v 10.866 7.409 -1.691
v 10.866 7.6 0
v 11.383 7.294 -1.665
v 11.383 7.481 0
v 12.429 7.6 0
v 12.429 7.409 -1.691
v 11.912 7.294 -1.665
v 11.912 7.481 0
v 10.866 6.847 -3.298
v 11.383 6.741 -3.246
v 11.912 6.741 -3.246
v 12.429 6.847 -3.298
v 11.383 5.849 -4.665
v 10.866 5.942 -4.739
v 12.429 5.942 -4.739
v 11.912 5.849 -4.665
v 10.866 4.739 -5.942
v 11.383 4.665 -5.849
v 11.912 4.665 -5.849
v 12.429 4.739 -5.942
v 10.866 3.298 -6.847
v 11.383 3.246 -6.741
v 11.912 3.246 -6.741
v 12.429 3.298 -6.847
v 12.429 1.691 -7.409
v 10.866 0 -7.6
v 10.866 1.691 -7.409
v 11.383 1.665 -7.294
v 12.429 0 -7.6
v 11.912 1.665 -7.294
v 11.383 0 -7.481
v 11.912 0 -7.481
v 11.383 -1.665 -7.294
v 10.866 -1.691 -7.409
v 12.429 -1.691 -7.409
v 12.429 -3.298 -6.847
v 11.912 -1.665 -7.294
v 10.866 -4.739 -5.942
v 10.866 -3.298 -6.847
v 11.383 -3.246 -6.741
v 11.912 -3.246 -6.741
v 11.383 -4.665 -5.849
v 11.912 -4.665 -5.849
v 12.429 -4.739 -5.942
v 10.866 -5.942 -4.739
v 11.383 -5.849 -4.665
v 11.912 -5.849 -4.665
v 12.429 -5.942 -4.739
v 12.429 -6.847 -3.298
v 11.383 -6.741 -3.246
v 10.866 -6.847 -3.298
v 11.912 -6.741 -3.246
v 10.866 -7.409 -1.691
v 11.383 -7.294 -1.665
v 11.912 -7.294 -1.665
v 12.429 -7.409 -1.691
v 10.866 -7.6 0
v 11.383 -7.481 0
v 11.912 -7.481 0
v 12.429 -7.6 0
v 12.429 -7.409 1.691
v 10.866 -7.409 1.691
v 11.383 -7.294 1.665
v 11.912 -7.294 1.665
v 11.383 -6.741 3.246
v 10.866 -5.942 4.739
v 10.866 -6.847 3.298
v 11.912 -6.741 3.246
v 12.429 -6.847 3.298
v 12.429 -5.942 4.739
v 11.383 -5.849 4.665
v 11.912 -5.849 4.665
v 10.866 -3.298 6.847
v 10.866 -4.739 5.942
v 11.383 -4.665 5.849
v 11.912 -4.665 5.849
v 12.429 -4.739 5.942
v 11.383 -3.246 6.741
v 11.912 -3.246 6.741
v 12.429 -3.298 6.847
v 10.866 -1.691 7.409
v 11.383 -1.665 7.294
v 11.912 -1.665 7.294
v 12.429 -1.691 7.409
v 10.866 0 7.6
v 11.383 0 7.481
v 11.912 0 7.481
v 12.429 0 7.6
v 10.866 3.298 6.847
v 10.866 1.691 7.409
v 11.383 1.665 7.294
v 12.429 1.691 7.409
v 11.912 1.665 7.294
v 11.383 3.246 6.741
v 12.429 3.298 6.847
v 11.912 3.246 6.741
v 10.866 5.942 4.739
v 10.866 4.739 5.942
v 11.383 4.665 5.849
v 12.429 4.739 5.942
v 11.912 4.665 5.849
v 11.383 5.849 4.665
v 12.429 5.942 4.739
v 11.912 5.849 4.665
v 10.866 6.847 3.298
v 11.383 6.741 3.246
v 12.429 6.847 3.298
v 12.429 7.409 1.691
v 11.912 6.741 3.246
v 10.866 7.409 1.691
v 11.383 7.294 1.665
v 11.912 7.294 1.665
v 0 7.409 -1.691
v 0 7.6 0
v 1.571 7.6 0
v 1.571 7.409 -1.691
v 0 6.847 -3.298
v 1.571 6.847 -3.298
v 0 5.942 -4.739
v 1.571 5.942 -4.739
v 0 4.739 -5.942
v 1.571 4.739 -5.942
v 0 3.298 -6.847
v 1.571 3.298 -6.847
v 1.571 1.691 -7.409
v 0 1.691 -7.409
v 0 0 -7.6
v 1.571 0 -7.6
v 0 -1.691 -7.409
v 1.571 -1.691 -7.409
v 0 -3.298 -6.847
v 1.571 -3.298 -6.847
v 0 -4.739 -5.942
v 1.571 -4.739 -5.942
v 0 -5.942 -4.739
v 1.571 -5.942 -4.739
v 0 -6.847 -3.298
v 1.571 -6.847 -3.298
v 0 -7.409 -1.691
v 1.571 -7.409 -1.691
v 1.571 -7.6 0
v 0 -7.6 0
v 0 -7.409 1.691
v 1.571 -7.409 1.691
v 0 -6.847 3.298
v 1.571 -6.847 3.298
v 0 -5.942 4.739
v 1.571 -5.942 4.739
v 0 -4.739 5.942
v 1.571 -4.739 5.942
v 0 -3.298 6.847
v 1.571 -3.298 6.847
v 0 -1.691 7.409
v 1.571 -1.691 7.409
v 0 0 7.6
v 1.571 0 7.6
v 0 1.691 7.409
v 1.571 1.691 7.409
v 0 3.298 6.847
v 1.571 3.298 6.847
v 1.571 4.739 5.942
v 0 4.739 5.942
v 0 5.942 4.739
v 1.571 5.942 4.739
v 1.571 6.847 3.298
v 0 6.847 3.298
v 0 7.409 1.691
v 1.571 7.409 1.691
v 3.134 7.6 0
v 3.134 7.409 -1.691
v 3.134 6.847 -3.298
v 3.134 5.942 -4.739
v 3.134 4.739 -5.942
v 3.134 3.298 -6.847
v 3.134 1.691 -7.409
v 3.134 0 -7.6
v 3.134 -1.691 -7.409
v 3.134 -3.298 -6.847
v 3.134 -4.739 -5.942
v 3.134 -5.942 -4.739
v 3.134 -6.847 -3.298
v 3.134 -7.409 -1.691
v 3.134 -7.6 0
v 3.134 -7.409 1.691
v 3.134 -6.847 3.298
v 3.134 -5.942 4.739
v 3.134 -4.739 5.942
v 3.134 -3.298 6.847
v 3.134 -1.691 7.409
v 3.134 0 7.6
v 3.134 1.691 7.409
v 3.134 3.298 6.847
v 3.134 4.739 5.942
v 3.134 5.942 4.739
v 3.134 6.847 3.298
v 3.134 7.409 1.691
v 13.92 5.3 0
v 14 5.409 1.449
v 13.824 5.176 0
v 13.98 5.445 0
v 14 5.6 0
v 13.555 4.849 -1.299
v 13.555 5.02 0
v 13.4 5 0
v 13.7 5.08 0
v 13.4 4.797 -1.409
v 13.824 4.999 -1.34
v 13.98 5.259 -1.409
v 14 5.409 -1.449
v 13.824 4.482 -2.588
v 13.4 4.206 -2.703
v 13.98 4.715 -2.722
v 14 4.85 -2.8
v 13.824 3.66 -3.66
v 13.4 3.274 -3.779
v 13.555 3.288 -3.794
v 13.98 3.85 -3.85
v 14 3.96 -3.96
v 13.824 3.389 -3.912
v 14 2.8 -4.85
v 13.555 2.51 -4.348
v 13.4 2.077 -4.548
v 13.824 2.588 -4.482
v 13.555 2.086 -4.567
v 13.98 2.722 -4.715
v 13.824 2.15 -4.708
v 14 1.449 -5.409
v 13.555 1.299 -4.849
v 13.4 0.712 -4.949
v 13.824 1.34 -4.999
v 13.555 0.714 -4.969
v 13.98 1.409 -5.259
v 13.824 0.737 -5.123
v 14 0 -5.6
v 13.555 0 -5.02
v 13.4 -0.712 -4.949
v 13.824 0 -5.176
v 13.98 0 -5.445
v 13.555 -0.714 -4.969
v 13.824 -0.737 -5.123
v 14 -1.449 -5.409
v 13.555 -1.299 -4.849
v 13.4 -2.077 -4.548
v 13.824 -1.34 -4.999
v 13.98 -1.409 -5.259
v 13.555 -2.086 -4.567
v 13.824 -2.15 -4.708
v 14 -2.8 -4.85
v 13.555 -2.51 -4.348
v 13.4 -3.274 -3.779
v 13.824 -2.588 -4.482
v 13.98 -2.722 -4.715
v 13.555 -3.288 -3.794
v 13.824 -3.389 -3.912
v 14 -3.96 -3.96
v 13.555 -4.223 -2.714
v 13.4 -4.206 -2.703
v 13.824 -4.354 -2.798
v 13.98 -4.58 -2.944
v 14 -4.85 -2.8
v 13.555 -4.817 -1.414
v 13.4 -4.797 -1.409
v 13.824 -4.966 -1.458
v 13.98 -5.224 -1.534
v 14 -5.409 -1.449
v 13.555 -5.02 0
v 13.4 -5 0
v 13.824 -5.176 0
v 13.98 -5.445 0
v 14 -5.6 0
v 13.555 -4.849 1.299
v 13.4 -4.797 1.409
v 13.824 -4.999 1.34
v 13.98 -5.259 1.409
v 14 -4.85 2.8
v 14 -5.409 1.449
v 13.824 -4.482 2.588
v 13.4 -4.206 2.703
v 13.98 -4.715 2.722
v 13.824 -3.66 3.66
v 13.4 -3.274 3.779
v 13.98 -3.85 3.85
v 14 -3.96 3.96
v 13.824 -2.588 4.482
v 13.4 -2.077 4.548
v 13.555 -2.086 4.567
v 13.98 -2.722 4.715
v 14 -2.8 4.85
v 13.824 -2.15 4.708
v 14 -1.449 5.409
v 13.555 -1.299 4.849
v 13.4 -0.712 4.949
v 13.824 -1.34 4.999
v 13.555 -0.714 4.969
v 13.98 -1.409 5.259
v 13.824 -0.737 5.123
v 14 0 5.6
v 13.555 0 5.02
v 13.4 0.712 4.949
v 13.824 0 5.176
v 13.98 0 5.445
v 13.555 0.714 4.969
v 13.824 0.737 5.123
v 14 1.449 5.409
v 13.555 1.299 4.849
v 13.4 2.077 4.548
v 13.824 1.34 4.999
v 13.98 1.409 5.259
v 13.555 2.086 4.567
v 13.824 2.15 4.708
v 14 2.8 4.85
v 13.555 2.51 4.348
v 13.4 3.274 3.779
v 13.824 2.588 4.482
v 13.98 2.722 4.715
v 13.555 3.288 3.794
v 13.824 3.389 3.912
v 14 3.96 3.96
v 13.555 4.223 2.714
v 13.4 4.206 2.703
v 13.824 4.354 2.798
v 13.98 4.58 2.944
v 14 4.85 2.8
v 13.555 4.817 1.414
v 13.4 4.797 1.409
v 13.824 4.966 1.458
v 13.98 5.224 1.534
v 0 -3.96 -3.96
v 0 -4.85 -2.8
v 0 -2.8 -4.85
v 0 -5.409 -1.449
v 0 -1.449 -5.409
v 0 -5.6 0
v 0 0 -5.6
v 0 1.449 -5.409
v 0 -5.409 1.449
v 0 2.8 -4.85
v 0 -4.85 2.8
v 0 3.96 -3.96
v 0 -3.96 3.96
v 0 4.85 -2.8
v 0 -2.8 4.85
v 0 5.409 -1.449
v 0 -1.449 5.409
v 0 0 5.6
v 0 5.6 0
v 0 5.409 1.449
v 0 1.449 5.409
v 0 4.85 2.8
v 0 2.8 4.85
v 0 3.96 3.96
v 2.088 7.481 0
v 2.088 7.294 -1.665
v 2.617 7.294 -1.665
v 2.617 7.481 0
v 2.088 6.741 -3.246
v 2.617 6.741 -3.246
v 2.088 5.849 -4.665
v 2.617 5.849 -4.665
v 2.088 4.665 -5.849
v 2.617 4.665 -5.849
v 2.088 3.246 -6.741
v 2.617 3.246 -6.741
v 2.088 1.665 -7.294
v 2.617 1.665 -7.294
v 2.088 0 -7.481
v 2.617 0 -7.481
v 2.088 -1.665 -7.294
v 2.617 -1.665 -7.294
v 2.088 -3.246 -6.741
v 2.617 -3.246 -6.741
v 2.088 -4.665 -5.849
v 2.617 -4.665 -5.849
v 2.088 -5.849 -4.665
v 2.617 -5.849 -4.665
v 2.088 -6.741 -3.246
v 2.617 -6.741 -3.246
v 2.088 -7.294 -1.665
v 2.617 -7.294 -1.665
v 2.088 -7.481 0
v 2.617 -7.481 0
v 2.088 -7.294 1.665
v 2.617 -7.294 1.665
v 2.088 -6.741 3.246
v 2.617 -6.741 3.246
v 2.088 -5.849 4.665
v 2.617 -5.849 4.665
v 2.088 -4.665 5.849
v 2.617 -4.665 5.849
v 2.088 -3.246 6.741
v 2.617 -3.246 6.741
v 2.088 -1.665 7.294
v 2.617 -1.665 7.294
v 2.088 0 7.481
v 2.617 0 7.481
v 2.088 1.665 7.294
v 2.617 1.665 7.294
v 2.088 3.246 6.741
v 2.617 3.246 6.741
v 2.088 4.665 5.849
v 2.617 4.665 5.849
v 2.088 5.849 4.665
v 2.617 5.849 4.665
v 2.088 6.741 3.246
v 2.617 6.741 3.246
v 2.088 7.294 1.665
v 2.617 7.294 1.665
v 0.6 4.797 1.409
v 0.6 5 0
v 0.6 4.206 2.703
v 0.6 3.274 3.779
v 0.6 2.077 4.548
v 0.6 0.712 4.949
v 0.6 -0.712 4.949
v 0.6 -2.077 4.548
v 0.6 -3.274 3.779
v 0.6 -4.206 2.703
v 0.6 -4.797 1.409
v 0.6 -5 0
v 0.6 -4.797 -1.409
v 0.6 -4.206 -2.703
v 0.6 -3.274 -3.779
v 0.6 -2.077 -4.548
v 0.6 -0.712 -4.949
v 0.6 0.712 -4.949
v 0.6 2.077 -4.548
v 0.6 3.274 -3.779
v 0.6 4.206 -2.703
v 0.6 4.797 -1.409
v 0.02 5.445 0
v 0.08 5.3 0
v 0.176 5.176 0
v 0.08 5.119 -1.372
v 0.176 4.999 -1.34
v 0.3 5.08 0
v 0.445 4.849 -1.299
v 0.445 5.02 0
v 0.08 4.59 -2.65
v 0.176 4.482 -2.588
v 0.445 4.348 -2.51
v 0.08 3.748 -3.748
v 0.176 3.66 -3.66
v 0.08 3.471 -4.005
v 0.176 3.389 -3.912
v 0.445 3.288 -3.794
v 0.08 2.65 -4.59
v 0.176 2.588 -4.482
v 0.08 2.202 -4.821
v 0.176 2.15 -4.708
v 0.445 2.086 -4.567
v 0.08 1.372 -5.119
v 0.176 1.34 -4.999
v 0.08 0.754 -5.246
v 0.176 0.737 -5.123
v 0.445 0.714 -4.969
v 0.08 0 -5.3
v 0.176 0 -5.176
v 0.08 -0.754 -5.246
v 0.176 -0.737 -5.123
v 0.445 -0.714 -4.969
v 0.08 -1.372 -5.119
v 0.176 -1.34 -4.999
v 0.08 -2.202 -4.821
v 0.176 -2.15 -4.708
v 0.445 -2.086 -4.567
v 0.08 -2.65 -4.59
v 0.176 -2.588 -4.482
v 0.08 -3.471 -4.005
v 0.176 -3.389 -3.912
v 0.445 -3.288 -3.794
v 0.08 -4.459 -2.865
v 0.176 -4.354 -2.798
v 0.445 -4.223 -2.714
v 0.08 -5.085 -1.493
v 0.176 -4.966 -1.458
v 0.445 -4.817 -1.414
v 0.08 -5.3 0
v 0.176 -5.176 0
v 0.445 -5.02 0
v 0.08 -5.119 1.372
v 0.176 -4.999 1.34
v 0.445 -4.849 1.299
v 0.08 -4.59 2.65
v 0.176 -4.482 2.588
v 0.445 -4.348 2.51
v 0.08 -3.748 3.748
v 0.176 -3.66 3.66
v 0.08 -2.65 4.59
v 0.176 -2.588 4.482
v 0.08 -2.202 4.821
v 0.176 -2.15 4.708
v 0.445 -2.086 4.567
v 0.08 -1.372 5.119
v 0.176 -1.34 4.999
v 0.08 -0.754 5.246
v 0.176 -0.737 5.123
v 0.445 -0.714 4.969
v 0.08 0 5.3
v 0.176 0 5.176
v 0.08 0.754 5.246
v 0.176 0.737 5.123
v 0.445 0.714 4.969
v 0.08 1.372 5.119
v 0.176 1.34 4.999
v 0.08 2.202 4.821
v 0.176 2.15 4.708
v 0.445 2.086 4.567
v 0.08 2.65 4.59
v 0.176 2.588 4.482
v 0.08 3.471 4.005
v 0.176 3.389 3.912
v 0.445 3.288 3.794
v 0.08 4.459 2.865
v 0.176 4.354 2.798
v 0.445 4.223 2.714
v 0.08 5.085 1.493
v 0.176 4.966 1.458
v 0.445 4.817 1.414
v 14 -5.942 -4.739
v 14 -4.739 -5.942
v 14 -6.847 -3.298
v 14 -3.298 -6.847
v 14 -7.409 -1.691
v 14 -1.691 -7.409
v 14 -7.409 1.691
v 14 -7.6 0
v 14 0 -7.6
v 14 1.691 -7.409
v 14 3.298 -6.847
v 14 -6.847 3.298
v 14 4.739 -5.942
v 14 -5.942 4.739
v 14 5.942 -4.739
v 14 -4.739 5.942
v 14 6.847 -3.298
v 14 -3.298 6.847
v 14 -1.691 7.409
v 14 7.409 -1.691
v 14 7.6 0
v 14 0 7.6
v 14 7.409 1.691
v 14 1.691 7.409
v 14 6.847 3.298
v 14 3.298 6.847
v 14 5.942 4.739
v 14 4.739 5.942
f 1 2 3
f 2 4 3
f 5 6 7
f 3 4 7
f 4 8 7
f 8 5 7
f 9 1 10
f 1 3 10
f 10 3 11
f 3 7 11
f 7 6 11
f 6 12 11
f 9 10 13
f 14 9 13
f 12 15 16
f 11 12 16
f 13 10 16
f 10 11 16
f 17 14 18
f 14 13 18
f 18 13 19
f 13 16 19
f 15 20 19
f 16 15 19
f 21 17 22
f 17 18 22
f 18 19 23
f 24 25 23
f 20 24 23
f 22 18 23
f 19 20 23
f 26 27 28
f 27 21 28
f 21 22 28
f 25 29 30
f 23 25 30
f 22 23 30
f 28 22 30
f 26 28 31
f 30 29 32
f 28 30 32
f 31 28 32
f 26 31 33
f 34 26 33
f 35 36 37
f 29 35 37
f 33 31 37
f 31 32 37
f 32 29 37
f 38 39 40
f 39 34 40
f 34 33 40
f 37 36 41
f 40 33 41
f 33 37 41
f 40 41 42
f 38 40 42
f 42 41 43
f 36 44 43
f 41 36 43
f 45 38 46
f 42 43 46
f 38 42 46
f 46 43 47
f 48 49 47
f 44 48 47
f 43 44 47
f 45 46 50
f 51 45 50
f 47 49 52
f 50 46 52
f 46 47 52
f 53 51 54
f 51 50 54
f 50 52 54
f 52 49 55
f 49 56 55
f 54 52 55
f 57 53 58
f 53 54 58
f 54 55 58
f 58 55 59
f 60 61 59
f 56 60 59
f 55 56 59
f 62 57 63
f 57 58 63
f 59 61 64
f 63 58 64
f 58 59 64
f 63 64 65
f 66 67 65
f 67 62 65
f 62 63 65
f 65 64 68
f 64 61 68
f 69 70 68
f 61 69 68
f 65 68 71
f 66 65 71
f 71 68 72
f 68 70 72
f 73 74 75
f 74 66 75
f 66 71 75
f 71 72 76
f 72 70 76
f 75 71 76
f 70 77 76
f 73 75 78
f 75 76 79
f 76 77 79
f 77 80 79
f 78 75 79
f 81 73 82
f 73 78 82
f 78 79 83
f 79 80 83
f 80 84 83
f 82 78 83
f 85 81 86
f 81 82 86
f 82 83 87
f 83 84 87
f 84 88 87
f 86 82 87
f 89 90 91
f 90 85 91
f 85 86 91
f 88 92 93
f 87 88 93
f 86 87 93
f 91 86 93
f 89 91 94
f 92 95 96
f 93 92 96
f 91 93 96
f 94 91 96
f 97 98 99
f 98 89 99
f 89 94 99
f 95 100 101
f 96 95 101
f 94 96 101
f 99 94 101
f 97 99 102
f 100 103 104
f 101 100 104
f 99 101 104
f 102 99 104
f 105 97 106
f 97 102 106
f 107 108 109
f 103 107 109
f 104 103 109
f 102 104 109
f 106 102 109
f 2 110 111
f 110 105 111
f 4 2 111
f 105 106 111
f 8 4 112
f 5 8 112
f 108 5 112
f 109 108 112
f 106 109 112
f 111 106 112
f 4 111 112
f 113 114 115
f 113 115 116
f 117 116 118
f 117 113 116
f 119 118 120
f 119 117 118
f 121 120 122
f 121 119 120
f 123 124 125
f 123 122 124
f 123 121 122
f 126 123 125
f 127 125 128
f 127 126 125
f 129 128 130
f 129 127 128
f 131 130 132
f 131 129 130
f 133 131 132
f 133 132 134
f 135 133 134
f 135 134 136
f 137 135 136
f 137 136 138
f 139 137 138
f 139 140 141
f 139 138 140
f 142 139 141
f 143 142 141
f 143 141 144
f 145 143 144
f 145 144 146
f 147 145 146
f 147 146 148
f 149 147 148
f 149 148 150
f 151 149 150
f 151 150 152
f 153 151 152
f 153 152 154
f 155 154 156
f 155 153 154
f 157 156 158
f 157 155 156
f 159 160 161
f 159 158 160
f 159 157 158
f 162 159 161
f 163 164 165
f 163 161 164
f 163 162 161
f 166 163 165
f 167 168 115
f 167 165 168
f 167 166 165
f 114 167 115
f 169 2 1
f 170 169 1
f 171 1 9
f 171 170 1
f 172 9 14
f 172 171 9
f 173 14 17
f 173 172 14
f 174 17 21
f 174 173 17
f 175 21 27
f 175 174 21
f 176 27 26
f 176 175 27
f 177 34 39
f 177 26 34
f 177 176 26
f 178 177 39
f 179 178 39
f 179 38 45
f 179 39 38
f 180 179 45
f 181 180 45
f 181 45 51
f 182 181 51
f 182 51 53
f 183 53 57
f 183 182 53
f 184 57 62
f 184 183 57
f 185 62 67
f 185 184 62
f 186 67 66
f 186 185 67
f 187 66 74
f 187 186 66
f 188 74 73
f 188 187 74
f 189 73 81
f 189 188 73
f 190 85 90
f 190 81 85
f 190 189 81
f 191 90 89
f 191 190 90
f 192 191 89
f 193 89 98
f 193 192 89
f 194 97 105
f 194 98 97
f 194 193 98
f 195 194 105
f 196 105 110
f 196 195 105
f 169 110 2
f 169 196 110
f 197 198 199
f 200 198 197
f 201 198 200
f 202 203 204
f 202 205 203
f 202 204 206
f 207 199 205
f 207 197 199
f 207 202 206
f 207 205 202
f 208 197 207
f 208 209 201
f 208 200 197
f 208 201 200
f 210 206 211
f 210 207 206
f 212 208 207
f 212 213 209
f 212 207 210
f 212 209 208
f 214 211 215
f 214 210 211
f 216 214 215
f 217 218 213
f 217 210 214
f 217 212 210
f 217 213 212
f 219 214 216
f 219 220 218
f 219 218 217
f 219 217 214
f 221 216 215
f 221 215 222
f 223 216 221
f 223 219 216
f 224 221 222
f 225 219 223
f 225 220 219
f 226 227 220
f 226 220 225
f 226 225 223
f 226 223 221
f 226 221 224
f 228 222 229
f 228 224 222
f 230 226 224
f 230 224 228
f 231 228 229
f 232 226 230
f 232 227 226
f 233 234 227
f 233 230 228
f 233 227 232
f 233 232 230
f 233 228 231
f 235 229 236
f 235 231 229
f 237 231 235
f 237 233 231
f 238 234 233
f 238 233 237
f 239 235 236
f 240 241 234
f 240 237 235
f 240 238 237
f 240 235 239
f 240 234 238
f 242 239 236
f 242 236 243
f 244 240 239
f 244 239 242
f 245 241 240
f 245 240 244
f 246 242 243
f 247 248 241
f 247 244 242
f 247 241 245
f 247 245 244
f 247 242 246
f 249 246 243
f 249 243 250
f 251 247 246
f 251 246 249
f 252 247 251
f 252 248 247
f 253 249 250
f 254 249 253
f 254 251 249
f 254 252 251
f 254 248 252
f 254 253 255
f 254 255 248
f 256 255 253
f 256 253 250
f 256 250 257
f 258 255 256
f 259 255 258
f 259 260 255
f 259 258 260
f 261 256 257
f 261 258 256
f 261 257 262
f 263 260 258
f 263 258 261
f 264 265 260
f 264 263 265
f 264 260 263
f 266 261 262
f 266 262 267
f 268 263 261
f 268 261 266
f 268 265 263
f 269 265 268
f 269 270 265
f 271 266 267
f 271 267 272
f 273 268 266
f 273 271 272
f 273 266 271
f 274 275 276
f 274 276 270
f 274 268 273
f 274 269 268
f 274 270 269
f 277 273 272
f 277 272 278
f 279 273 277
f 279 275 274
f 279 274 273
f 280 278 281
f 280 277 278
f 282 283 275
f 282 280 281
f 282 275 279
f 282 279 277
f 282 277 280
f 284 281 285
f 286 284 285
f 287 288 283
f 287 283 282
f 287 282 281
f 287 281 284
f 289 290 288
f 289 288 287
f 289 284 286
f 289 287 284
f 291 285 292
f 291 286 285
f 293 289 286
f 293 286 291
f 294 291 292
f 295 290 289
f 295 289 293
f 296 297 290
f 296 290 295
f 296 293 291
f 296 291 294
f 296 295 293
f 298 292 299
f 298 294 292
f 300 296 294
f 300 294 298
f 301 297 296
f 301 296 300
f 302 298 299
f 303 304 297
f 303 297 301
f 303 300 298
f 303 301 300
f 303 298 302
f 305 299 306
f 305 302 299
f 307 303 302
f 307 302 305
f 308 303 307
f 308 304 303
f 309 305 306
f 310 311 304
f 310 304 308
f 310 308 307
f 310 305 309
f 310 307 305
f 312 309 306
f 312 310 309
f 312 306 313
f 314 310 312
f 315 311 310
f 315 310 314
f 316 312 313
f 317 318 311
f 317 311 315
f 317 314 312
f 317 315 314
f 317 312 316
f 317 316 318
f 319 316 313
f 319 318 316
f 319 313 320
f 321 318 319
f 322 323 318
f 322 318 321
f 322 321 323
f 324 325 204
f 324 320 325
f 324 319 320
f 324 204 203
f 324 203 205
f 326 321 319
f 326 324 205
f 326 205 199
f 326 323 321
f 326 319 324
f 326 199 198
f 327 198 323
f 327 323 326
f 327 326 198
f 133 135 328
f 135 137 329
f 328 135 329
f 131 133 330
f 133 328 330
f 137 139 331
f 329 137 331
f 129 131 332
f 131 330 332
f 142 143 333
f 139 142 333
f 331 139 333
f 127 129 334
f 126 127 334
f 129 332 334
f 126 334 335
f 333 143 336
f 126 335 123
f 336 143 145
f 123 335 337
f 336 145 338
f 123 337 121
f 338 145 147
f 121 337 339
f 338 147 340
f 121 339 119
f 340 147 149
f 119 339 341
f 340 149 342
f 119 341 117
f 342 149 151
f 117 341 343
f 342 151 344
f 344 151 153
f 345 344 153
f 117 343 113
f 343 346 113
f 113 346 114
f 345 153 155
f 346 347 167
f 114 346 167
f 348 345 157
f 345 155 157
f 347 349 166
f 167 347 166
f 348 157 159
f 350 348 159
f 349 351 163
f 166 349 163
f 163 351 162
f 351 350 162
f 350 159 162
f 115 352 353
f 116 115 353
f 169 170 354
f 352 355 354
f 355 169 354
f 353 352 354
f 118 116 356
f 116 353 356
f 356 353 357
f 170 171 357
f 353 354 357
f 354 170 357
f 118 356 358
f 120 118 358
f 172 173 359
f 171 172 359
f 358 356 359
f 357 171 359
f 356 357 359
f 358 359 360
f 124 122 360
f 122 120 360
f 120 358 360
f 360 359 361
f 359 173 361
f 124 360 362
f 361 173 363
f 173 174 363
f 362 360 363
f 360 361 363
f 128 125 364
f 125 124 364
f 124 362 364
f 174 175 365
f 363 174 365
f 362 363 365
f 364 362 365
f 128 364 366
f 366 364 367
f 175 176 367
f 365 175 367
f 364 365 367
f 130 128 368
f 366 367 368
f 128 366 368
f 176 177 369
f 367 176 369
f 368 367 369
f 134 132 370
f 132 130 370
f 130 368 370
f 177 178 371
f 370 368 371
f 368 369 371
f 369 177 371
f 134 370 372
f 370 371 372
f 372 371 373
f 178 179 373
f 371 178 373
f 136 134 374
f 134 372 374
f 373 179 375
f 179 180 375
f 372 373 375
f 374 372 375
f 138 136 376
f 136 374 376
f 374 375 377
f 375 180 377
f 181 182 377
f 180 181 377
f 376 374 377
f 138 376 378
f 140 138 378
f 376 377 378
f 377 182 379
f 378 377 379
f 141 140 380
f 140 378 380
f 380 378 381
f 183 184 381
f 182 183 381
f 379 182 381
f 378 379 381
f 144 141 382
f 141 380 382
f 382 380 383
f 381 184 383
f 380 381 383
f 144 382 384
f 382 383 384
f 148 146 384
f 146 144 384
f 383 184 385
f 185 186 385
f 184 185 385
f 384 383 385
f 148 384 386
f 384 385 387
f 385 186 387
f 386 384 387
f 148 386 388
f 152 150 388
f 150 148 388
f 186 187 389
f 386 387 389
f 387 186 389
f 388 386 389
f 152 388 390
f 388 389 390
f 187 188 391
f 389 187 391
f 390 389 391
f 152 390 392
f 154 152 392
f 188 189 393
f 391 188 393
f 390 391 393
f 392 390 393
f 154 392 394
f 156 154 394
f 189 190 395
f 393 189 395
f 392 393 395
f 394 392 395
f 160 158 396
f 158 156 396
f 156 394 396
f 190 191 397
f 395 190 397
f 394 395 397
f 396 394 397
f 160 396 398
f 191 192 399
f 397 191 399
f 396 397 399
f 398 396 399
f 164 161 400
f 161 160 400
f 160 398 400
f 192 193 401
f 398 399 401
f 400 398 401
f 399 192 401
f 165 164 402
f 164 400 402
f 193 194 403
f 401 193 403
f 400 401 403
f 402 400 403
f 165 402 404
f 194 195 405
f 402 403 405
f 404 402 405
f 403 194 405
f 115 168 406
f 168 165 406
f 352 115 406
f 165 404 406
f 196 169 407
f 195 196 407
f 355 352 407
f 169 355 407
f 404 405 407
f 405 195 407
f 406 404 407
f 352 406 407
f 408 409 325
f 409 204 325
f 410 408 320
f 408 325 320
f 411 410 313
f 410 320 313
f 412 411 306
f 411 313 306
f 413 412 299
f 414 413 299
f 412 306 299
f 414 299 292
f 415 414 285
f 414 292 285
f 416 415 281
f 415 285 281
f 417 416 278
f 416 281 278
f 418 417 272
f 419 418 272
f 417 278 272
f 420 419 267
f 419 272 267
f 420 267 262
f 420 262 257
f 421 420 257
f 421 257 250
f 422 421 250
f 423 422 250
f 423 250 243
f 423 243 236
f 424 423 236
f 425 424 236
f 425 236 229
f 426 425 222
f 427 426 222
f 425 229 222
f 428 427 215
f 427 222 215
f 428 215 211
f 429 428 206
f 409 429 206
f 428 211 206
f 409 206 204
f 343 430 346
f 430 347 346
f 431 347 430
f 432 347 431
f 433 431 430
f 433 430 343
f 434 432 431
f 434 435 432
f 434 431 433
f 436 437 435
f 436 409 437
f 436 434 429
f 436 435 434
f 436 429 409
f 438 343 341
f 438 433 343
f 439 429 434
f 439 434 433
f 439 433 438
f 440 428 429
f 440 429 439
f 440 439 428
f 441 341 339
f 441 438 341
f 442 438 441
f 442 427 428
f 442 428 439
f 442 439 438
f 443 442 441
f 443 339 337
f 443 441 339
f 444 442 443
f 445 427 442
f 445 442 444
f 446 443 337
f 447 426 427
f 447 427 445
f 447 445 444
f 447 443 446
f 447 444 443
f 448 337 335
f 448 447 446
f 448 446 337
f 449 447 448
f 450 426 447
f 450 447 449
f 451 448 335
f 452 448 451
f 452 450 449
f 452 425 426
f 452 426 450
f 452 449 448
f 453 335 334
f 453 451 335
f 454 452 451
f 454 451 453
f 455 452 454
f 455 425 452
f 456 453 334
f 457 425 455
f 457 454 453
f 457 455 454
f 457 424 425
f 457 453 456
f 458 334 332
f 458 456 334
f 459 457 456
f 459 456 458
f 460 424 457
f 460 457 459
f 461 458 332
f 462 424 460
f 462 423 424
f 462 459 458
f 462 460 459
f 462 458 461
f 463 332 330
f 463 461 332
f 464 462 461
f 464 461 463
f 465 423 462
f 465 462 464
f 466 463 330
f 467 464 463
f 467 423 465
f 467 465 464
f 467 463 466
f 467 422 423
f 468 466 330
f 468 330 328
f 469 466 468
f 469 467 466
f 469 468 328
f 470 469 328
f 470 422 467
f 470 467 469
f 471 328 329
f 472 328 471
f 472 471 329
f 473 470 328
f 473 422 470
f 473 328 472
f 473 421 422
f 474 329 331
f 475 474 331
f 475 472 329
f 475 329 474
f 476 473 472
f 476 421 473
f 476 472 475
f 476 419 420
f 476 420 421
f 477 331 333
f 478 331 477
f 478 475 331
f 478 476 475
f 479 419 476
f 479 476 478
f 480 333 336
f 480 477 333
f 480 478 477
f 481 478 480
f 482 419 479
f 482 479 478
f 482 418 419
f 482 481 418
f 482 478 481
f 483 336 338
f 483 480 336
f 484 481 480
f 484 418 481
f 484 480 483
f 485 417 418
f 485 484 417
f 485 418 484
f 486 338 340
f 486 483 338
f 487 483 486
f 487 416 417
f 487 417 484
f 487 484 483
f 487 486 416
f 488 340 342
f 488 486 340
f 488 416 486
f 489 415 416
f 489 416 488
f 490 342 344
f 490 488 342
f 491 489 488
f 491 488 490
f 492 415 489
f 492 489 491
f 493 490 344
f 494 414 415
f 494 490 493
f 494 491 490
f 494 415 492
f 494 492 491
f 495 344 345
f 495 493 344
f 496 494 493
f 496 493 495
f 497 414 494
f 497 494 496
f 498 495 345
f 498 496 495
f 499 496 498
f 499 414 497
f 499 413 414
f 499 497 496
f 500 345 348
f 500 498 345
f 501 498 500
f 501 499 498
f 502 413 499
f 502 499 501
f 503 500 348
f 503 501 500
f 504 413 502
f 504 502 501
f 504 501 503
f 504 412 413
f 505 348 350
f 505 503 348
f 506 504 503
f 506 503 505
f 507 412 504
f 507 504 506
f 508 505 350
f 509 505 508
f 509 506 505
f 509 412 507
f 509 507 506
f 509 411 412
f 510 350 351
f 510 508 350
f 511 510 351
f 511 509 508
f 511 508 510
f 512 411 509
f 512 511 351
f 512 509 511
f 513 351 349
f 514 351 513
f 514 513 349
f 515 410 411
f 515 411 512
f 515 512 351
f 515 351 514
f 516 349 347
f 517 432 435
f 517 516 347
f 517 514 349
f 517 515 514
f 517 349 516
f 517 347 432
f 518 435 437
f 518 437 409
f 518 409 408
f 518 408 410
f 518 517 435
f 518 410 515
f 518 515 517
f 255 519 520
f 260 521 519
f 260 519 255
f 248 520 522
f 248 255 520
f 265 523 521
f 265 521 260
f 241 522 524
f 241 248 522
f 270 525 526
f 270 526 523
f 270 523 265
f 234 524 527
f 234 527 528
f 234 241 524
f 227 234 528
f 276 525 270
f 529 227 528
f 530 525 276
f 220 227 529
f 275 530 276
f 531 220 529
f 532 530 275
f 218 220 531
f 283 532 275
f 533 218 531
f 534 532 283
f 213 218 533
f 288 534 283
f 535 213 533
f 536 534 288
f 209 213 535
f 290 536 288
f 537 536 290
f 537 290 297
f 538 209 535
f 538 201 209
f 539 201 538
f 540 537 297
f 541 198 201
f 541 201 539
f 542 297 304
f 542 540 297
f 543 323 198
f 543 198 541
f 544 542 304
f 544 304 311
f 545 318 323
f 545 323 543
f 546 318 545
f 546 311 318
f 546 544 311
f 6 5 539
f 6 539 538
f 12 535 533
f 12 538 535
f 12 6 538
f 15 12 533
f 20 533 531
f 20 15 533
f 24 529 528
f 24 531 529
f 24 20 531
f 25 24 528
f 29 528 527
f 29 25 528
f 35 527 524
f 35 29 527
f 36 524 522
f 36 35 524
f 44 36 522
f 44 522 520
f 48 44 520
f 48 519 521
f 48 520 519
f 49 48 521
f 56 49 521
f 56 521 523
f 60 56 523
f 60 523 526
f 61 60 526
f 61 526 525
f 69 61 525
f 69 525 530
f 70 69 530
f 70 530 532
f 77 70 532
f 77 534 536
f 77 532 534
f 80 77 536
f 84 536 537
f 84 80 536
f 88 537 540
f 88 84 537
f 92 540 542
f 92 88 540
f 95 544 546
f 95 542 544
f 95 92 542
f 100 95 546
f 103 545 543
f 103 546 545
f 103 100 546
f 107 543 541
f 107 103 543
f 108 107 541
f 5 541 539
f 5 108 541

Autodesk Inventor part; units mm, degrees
sketch "Sketch_1" plane through (0, 0, 0) normal (0, 0, 1) x (1, 0, 0)
  line L0 (14, 0) -> (0, 0)
  arc A0 (0, 5.6) -> (0.6, 5) centre (0.6, 5.6) ccw
  line L1 (0.6, 5) -> (13.4, 5)
  arc A1 (13.4, 5) -> (14, 5.6) centre (13.4, 5.6) ccw
  line L2 (14, 5.6) -> (14, 7.6)
  line L3 (14, 7.6) -> (12.4286, 7.6)
  arc A2 (10.8662, 7.6) -> (12.4286, 7.6) centre (11.6474, 9.8192) ccw
  line L4 (10.8662, 7.6) -> (3.1338, 7.6)
  arc A3 (1.5714, 7.6) -> (3.1338, 7.6) centre (2.3526, 9.8192) ccw
  line L5 (1.5714, 7.6) -> (0, 7.6)
  line L6 (0, 7.6) -> (0, 5.6)
revolve "Revolution1" add sketch "Sketch_1" angle 360 about axis through (14, 0, 0) along (1, 0, 0)
ref_plane "ip_cb_11_1_XY" through (2.3526, 9.0717, 3.7576) normal (1, 0, 0) x (0, 0, -1)
ref_plane "ip_cb_11_1_YZ" through (2.3526, 9.0717, 3.7576) normal (0, 0, -1) x (0, 1, 0)
ref_plane "ip_cb_11_1_ZX" through (2.3526, 9.0717, 3.7576) normal (0, 1, 0) x (1, 0, 0)
ref_plane "ip_cb_11_2_XY" through (2.3526, 3.7576, 9.0717) normal (1, 0, 0) x (0, 0, -1)
ref_plane "ip_cb_11_2_YZ" through (2.3526, 3.7576, 9.0717) normal (0, 0, -1) x (0, 1, 0)
ref_plane "ip_cb_11_2_ZX" through (2.3526, 3.7576, 9.0717) normal (0, 1, 0) x (1, 0, 0)
ref_plane "ip_cb_11_3_XY" through (2.3526, -3.7576, 9.0717) normal (1, 0, 0) x (0, 0, -1)
ref_plane "ip_cb_11_3_YZ" through (2.3526, -3.7576, 9.0717) normal (0, 0, -1) x (0, 1, 0)
ref_plane "ip_cb_11_3_ZX" through (2.3526, -3.7576, 9.0717) normal (0, 1, 0) x (1, 0, 0)
ref_plane "ip_cb_11_4_XY" through (2.3526, -9.0717, 3.7576) normal (1, 0, 0) x (0, 0, -1)
ref_plane "ip_cb_11_4_YZ" through (2.3526, -9.0717, 3.7576) normal (0, 0, -1) x (0, 1, 0)
ref_plane "ip_cb_11_4_ZX" through (2.3526, -9.0717, 3.7576) normal (0, 1, 0) x (1, 0, 0)
ref_plane "ip_cb_11_5_XY" through (2.3526, -9.0717, -3.7576) normal (1, 0, 0) x (0, 0, -1)
ref_plane "ip_cb_11_5_YZ" through (2.3526, -9.0717, -3.7576) normal (0, 0, -1) x (0, 1, 0)
ref_plane "ip_cb_11_5_ZX" through (2.3526, -9.0717, -3.7576) normal (0, 1, 0) x (1, 0, 0)
ref_plane "ip_cb_11_6_XY" through (2.3526, -3.7576, -9.0717) normal (1, 0, 0) x (0, 0, -1)
ref_plane "ip_cb_11_6_YZ" through (2.3526, -3.7576, -9.0717) normal (0, 0, -1) x (0, 1, 0)
ref_plane "ip_cb_11_6_ZX" through (2.3526, -3.7576, -9.0717) normal (0, 1, 0) x (1, 0, 0)
ref_plane "ip_cb_11_7_XY" through (2.3526, 3.7576, -9.0717) normal (1, 0, 0) x (0, 0, -1)
ref_plane "ip_cb_11_7_YZ" through (2.3526, 3.7576, -9.0717) normal (0, 0, -1) x (0, 1, 0)
ref_plane "ip_cb_11_7_ZX" through (2.3526, 3.7576, -9.0717) normal (0, 1, 0) x (1, 0, 0)
ref_plane "ip_cb_11_8_XY" through (2.3526, 9.0717, -3.7576) normal (1, 0, 0) x (0, 0, -1)
ref_plane "ip_cb_11_8_YZ" through (2.3526, 9.0717, -3.7576) normal (0, 0, -1) x (0, 1, 0)
ref_plane "ip_cb_11_8_ZX" through (2.3526, 9.0717, -3.7576) normal (0, 1, 0) x (1, 0, 0)
ref_plane "ip_cb_1a_XY" through (0, 0, 0) normal (-1, 0, 0) x (0, 0, -1)
ref_plane "ip_cb_1a_YZ" through (0, 0, 0) normal (0, 0, -1) x (0, -1, 0)
ref_plane "ip_cb_1a_ZX" through (0, 0, 0) normal (0, -1, 0) x (-1, 0, 0)
ref_plane "ip_cb_22_1_XY" through (11.6474, 9.8192, 0) normal (1, 0, 0) x (0, 0, -1)
ref_plane "ip_cb_22_1_YZ" through (11.6474, 9.8192, 0) normal (0, 0, -1) x (0, 1, 0)
ref_plane "ip_cb_22_1_ZX" through (11.6474, 9.8192, 0) normal (0, 1, 0) x (1, 0, 0)
ref_plane "ip_cb_22_2_XY" through (11.6474, 6.9432, 6.9432) normal (1, 0, 0) x (0, 0, -1)
ref_plane "ip_cb_22_2_YZ" through (11.6474, 6.9432, 6.9432) normal (0, 0, -1) x (0, 1, 0)
ref_plane "ip_cb_22_2_ZX" through (11.6474, 6.9432, 6.9432) normal (0, 1, 0) x (1, 0, 0)
ref_plane "ip_cb_22_3_XY" through (11.6474, 0, 9.8192) normal (1, 0, 0) x (0, 0, -1)
ref_plane "ip_cb_22_3_YZ" through (11.6474, 0, 9.8192) normal (0, 0, -1) x (0, 1, 0)
ref_plane "ip_cb_22_3_ZX" through (11.6474, 0, 9.8192) normal (0, 1, 0) x (1, 0, 0)
ref_plane "ip_cb_22_4_XY" through (11.6474, -6.9432, 6.9432) normal (1, 0, 0) x (0, 0, -1)
ref_plane "ip_cb_22_4_YZ" through (11.6474, -6.9432, 6.9432) normal (0, 0, -1) x (0, 1, 0)
ref_plane "ip_cb_22_4_ZX" through (11.6474, -6.9432, 6.9432) normal (0, 1, 0) x (1, 0, 0)
ref_plane "ip_cb_22_5_XY" through (11.6474, -9.8192, 0) normal (1, 0, 0) x (0, 0, -1)
ref_plane "ip_cb_22_5_YZ" through (11.6474, -9.8192, 0) normal (0, 0, -1) x (0, 1, 0)
ref_plane "ip_cb_22_5_ZX" through (11.6474, -9.8192, 0) normal (0, 1, 0) x (1, 0, 0)
ref_plane "ip_cb_22_6_XY" through (11.6474, -6.9432, -6.9432) normal (1, 0, 0) x (0, 0, -1)
ref_plane "ip_cb_22_6_YZ" through (11.6474, -6.9432, -6.9432) normal (0, 0, -1) x (0, 1, 0)
ref_plane "ip_cb_22_6_ZX" through (11.6474, -6.9432, -6.9432) normal (0, 1, 0) x (1, 0, 0)
ref_plane "ip_cb_22_7_XY" through (11.6474, 0, -9.8192) normal (1, 0, 0) x (0, 0, -1)
ref_plane "ip_cb_22_7_YZ" through (11.6474, 0, -9.8192) normal (0, 0, -1) x (0, 1, 0)
ref_plane "ip_cb_22_7_ZX" through (11.6474, 0, -9.8192) normal (0, 1, 0) x (1, 0, 0)
ref_plane "ip_cb_22_8_XY" through (11.6474, 6.9432, -6.9432) normal (1, 0, 0) x (0, 0, -1)
ref_plane "ip_cb_22_8_YZ" through (11.6474, 6.9432, -6.9432) normal (0, 0, -1) x (0, 1, 0)
ref_plane "ip_cb_22_8_ZX" through (11.6474, 6.9432, -6.9432) normal (0, 1, 0) x (1, 0, 0)
properties part number "2200 Inner Ring"
